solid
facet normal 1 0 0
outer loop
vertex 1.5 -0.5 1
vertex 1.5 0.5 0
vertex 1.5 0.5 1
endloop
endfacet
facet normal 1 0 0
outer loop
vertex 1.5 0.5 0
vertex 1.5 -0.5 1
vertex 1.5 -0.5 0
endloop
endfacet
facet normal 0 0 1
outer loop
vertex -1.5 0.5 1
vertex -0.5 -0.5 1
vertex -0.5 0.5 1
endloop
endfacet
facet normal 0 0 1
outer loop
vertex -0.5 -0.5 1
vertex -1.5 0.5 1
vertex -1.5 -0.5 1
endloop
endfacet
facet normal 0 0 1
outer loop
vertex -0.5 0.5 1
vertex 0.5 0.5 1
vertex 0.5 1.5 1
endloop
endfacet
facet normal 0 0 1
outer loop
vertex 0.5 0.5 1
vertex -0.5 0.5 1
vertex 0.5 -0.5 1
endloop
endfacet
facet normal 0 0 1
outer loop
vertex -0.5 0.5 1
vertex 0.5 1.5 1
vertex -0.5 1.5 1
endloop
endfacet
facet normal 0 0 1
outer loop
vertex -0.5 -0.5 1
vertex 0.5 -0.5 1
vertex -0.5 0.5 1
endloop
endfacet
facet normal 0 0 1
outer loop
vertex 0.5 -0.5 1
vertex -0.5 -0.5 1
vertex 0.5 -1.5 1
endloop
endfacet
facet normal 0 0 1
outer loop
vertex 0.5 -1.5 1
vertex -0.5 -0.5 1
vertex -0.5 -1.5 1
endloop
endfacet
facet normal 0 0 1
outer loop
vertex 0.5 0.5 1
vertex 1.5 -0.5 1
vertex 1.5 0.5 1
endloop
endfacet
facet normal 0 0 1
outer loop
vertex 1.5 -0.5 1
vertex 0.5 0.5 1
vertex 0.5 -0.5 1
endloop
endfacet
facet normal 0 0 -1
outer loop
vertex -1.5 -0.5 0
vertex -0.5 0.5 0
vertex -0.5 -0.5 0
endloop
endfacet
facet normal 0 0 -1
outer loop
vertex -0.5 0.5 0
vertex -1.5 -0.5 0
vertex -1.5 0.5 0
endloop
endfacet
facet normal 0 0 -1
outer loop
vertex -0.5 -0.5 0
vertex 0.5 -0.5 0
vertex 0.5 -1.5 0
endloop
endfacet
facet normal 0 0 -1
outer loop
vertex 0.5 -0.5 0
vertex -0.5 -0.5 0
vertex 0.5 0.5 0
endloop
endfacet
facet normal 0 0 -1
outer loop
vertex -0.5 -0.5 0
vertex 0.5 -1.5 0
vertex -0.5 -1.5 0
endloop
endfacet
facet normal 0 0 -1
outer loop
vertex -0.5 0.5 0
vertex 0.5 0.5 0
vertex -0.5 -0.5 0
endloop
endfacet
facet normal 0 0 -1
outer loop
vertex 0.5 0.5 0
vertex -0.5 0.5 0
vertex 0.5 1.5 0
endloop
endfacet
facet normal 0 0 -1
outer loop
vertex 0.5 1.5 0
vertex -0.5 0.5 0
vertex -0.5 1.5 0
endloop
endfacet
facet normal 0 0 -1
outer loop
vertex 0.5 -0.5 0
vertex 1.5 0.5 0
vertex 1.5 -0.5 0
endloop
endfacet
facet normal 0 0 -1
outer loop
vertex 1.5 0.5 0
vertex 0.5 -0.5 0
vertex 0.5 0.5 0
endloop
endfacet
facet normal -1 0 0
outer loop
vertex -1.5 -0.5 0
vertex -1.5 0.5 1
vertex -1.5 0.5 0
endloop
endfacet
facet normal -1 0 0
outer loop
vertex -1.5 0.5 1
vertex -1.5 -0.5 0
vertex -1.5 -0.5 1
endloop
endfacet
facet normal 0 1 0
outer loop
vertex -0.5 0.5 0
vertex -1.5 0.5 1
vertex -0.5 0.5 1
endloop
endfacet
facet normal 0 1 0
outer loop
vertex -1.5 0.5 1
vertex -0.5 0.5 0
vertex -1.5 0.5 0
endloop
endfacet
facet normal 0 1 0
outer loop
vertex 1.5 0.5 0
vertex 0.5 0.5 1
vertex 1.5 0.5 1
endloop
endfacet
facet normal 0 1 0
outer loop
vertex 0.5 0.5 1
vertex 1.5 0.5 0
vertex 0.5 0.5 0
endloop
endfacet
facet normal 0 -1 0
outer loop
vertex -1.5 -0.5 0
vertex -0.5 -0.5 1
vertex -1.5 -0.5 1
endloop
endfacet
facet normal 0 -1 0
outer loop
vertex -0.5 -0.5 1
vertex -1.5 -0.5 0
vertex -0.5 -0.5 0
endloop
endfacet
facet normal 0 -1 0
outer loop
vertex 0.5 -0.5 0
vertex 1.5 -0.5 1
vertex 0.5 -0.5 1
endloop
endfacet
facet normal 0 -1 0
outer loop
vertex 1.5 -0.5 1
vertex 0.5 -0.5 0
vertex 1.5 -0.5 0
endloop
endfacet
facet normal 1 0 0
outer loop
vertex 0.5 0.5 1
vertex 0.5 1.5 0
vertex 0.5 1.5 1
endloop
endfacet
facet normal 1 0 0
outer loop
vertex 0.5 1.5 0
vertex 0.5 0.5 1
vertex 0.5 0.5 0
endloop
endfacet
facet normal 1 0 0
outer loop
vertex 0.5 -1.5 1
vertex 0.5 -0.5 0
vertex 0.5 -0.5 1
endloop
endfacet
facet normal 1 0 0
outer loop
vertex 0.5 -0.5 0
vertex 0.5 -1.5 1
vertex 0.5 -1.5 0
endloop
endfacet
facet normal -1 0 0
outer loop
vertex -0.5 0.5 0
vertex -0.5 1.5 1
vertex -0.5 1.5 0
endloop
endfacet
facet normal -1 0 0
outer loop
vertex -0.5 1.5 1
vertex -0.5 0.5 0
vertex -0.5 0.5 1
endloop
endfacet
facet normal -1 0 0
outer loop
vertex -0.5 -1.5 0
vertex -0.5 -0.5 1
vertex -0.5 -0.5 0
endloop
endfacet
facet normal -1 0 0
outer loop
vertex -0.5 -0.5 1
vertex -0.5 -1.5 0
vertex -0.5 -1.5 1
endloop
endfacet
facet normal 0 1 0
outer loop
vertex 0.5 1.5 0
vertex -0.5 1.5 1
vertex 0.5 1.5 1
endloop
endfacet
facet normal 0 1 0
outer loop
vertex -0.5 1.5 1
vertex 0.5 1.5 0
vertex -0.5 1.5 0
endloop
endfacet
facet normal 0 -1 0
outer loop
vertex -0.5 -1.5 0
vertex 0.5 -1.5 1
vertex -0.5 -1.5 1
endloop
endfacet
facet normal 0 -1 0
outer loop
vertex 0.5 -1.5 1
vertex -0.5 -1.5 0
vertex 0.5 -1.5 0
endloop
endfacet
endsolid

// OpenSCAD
// 3D Minus for Stacks of Shapes
// Copyright Slashee the Cow
color("IndianRed")
translate([0,0,0.5]){
    cube([3,1,1],center=true);
    cube([1,3,1],center=true);
}
